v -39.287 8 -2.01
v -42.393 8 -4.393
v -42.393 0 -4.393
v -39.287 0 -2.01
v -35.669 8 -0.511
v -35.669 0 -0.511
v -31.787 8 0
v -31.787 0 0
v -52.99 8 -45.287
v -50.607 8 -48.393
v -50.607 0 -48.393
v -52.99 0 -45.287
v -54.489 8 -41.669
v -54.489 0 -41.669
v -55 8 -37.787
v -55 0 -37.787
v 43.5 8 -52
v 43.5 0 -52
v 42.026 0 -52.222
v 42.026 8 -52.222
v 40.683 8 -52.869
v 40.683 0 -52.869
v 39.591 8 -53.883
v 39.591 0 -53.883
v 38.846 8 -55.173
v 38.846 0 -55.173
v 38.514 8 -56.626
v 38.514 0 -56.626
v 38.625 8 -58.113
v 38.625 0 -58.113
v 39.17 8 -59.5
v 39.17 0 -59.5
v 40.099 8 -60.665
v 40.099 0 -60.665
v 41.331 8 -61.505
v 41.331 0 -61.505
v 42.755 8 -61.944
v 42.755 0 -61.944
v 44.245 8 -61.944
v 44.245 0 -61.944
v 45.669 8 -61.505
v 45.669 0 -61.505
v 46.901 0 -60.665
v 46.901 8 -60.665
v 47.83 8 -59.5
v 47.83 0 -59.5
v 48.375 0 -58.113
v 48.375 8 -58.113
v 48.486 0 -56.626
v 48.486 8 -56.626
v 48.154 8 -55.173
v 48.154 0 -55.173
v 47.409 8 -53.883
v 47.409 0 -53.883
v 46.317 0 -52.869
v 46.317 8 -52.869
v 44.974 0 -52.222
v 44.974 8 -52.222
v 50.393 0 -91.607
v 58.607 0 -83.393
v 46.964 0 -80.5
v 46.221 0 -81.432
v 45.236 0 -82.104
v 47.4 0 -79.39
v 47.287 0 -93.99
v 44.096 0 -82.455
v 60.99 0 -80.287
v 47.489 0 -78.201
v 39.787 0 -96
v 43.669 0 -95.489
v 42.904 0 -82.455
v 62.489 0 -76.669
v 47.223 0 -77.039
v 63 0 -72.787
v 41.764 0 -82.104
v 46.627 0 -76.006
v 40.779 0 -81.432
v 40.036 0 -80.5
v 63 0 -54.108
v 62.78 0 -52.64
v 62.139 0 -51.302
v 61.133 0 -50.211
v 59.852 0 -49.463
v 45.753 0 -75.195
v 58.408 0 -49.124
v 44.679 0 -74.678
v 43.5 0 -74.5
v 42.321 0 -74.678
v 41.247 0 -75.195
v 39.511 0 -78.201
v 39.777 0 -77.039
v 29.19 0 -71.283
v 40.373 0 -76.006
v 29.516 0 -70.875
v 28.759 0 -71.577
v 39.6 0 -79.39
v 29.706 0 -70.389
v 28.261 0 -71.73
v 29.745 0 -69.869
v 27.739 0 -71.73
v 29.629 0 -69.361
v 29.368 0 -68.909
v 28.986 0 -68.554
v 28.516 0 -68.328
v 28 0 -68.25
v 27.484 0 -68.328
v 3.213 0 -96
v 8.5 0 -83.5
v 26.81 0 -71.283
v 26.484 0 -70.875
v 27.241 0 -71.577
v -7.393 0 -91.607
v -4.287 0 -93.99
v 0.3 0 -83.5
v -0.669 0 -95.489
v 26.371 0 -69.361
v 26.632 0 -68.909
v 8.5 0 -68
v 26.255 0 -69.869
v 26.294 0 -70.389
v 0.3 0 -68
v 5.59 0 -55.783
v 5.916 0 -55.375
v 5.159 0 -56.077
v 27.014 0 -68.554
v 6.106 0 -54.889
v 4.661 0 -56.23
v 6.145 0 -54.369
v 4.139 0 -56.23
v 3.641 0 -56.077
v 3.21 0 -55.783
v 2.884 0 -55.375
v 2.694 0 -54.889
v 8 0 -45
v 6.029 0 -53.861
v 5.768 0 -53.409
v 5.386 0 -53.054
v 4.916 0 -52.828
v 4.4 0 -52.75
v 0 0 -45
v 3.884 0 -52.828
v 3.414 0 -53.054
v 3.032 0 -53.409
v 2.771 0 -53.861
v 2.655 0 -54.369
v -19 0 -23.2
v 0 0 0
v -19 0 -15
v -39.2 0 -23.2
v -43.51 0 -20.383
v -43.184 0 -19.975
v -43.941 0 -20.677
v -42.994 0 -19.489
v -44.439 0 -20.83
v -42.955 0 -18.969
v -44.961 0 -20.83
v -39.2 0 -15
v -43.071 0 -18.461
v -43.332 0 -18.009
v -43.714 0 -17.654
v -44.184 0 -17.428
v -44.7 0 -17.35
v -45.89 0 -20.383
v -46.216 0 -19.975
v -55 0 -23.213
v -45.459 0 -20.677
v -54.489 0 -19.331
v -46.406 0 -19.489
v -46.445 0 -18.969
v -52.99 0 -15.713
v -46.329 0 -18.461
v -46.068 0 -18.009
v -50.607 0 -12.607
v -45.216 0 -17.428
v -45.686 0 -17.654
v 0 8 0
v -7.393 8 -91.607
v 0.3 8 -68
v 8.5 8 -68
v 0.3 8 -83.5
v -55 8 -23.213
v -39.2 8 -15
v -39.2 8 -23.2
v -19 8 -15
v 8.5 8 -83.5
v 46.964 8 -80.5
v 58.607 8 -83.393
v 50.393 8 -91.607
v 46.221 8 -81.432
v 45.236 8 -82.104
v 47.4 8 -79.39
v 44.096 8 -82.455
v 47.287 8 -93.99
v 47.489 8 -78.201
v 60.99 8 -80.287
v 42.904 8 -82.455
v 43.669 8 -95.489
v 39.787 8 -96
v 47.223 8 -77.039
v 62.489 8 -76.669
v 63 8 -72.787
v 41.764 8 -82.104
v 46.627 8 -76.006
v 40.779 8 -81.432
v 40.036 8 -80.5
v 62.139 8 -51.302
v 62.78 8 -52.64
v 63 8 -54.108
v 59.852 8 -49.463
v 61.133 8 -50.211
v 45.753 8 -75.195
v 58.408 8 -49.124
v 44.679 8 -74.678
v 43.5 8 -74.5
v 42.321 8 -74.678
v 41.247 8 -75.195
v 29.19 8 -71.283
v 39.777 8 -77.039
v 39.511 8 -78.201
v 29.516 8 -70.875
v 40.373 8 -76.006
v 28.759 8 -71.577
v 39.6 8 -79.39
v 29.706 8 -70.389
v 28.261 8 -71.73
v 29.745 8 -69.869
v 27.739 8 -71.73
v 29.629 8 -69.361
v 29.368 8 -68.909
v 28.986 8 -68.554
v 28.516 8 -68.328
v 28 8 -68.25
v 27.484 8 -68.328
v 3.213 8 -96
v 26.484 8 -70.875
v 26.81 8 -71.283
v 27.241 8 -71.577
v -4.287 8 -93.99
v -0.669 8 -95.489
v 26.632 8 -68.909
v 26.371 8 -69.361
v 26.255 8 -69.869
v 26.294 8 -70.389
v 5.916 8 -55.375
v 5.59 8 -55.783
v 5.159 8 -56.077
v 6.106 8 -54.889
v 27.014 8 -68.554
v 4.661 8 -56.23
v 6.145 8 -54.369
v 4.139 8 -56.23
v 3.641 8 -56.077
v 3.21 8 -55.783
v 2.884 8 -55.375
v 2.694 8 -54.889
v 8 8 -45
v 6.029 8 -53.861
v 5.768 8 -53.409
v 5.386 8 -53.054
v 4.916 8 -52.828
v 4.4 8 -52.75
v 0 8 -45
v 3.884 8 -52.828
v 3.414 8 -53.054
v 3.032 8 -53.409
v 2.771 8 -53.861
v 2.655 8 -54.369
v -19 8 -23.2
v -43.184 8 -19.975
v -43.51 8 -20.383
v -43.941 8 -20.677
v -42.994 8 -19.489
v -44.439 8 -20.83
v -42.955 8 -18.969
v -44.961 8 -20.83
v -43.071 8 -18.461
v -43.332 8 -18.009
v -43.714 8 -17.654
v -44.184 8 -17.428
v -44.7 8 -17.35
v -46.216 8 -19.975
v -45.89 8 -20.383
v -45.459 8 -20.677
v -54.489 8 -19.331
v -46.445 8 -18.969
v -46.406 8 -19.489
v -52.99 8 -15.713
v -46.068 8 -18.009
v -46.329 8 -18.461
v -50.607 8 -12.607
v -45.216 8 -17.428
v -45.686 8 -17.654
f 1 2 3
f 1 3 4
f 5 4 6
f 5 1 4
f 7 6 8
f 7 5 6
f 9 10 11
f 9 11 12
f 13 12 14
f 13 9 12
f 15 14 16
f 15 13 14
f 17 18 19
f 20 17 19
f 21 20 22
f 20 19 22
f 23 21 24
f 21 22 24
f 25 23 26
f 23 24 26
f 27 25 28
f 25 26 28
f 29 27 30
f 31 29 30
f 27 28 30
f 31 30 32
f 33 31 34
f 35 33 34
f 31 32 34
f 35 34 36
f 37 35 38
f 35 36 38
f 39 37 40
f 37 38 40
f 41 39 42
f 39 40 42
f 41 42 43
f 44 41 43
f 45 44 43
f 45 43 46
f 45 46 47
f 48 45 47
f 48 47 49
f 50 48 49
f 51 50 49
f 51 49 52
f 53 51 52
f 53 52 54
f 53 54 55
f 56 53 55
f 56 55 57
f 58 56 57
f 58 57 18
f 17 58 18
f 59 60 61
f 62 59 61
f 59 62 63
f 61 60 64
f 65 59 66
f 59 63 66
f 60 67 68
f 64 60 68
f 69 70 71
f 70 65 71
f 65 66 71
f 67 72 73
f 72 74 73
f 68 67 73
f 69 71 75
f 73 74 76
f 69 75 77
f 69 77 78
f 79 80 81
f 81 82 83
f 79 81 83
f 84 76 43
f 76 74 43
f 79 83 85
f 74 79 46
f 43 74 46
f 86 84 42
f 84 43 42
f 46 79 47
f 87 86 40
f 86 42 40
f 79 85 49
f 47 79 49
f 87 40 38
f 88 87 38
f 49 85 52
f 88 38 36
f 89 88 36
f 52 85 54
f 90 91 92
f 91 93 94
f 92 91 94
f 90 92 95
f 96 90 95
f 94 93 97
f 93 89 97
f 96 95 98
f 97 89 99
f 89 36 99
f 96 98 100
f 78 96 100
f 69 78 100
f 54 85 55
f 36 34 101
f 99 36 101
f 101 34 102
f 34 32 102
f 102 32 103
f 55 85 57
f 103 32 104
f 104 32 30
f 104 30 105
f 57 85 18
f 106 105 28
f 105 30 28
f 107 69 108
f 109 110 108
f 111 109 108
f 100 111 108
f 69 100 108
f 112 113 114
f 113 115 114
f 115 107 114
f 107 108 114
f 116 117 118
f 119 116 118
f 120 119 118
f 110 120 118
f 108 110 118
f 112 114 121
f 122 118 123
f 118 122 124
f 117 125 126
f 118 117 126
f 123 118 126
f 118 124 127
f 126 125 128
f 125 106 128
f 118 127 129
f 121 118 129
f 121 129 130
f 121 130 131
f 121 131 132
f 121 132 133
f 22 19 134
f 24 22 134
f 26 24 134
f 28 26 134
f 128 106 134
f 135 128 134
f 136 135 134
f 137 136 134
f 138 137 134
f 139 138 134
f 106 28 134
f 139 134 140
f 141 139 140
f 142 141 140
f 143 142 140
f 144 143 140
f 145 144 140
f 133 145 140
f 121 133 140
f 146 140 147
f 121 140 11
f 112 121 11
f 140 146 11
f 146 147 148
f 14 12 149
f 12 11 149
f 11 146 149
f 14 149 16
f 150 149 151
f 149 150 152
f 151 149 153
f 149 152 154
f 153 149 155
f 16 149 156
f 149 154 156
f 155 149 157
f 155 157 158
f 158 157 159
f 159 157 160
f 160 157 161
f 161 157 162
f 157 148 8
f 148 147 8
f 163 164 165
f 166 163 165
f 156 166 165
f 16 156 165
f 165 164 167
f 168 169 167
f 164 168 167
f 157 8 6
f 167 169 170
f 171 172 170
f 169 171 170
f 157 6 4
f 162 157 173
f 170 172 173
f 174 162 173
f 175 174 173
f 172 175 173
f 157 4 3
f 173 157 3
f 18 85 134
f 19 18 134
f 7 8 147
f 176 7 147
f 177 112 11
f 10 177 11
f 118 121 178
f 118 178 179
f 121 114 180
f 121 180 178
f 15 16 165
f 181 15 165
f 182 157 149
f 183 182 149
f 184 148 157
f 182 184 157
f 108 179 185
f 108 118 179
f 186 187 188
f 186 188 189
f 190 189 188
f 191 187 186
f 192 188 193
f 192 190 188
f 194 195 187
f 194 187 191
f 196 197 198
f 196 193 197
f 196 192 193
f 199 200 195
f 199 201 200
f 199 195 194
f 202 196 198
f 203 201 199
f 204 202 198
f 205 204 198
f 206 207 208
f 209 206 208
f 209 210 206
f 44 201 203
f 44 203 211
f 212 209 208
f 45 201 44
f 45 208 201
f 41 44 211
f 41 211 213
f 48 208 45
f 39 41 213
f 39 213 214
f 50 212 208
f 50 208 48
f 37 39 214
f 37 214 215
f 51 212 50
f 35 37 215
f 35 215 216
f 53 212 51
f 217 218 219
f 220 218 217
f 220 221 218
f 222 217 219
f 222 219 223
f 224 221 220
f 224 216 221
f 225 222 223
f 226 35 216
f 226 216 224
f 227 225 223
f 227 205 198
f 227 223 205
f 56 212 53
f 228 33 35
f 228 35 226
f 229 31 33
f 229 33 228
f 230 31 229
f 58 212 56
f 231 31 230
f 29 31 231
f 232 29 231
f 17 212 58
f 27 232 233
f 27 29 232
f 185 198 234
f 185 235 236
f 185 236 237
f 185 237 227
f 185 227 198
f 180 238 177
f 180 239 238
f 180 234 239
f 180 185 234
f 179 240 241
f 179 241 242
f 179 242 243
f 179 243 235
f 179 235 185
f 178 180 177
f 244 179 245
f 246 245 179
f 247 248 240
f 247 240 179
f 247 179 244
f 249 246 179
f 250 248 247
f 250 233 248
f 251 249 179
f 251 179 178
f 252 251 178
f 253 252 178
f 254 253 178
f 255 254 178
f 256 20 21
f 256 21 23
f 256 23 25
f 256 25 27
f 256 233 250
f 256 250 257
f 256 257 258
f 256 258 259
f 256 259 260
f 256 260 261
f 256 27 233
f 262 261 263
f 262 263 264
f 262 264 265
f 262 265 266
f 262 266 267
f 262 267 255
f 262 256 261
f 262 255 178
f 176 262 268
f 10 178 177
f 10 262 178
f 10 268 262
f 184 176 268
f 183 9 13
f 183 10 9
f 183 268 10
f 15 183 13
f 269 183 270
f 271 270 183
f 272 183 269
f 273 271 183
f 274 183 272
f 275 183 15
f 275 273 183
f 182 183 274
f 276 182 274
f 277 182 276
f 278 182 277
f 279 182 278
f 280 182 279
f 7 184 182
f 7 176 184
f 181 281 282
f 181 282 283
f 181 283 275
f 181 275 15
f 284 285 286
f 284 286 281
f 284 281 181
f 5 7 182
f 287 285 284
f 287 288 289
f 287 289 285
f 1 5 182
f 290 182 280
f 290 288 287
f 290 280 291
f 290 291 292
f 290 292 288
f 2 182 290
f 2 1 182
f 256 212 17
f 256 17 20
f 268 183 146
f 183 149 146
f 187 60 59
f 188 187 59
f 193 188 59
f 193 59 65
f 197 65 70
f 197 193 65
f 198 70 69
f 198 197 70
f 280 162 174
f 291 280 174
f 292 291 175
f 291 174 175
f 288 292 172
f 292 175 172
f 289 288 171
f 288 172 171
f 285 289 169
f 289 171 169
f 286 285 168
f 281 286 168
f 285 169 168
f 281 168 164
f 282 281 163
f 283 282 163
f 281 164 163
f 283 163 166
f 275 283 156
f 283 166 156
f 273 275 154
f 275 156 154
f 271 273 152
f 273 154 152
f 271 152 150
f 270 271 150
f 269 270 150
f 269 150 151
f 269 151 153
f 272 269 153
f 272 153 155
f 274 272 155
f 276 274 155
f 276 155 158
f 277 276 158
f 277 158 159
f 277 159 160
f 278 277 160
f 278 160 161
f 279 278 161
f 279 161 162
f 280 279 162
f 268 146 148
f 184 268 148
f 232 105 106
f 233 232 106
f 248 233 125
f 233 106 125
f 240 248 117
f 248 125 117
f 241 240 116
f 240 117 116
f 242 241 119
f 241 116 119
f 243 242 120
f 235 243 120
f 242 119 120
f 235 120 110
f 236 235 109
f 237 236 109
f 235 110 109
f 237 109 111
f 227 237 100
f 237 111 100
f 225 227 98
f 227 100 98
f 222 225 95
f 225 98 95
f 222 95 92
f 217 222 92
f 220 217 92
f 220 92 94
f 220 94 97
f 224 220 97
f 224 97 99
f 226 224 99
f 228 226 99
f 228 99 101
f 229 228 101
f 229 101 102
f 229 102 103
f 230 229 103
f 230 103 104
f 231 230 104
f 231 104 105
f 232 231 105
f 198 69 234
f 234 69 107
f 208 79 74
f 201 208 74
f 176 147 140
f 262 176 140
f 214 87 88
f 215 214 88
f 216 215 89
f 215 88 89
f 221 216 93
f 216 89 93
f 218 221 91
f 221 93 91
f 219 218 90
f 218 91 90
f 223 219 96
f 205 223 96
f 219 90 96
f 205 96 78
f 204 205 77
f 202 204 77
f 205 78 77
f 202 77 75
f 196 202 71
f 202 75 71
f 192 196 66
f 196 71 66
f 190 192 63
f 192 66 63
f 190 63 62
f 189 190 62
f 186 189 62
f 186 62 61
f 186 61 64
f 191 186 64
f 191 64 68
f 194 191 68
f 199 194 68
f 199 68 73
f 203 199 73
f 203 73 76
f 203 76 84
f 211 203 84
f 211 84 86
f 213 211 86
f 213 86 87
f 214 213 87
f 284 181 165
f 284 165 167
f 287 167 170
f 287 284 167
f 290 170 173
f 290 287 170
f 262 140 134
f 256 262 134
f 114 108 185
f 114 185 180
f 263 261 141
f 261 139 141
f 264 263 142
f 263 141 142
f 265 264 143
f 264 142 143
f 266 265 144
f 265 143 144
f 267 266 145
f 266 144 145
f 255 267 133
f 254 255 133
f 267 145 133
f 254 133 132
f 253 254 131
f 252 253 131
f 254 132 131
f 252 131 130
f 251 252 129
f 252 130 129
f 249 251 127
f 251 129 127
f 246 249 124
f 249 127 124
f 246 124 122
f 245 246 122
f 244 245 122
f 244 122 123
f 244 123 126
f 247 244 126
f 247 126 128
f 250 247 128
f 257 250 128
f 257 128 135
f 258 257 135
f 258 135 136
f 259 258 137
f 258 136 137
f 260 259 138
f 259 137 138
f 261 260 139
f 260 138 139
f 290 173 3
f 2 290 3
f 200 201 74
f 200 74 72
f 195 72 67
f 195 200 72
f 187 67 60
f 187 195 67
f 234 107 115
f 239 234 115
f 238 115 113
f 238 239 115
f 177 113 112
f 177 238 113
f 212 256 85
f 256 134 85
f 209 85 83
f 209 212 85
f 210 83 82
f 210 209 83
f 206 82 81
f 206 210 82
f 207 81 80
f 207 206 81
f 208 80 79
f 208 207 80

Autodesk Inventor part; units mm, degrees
ref_plane "YZ Plane" through (0, 0, 0) normal (1, 0, 0) x (0, 1, 0)
sketch "Sketch1" plane through (0, 0, 0) normal (0, 1, 0) x (-1, 0, 0)
  line L0 (38, 0) -> (0, 0)
  line L1 (0, 0) -> (0, -45)
  line L2 (0, -45) -> (-8, -45)
  line L3 (-8, -45) -> (-63, -49.5)
  line L4 (-63, -49.5) -> (-63, -79)
  line L5 (-63, -79) -> (-46, -96)
  line L6 (-46, -96) -> (3, -96)
  line L7 (3, -96) -> (55, -44)
  line L8 (55, -44) -> (55, -17)
  line L9 (55, -17) -> (38, 0)
  line L10 (19, -15) -> (39.2, -15)
  line L11 (39.2, -15) -> (39.2, -23.2)
  line L12 (39.2, -23.2) -> (19, -23.2)
  line L13 (19, -23.2) -> (19, -15)
  line L14 (-0.3, -68) -> (-8.5, -68)
  line L15 (-8.5, -68) -> (-8.5, -83.5)
  line L16 (-8.5, -83.5) -> (-0.3, -83.5)
  line L17 (-0.3, -83.5) -> (-0.3, -68)
  dimension "d0" = 45
  dimension "d1" = 55
  dimension "d2" = 63
  dimension "d3" = 96
  dimension "d4" = 8
  dimension "d6" = 45
  dimension "d7" = 45
  dimension "d8" = 45
  dimension "d9" = 46.5
  dimension "d10" = 17
  dimension "d11" = 44
  dimension "d12" = 17
  dimension "d13" = 8.2
  dimension "d14" = 20.2
  dimension "d15" = 8.2
  dimension "d16" = 15.5
  dimension "d17" = 12.5
  dimension "d18" = 19
  dimension "d19" = 15
  dimension "d20" = 54.5
extrude "Extrusion1" add sketch "Sketch1" along normal blind 8
fillet "Fillet1" radius 15 6 edges at (-38, 4, 0) (-55, 4, -17) (-55, 4, -44) (-3, 4, -96) (46, 4, -96) (63, 4, -79)
fillet "Fillet2" radius 5 1 edges at (63, 4, -49.5)
sketch "Sketch2" plane through (0, 8, 0) normal (0, 1, 0) x (1, 0, 0)
  arc A0 (58.4077, 49.1243) -> (63, 54.1076) centre (58, 54.1076) ccw construction
  line L0 (63, 54.1076) -> (63, 72.7868) construction
  arc A1 (63, 72.7868) -> (58.6066, 83.3934) centre (48, 72.7868) ccw construction
  line L1 (58.6066, 83.3934) -> (50.3934, 91.6066) construction
  arc A2 (50.3934, 91.6066) -> (39.7868, 96) centre (39.7868, 81) ccw construction
  line L2 (39.7868, 96) -> (3.2132, 96) construction
  arc A3 (3.2132, 96) -> (-7.3934, 91.6066) centre (3.2132, 81) ccw construction
  line L3 (-7.3934, 91.6066) -> (-50.6066, 48.3934) construction
  arc A4 (-50.6066, 48.3934) -> (-55, 37.7868) centre (-40, 37.7868) ccw construction
  line L4 (-55, 37.7868) -> (-55, 23.2132) construction
  arc A5 (-55, 23.2132) -> (-50.6066, 12.6066) centre (-40, 23.2132) ccw construction
  line L5 (-50.6066, 12.6066) -> (-42.3934, 4.3934) construction
  arc A6 (-42.3934, 4.3934) -> (-31.7868, 0) centre (-31.7868, 15) ccw construction
  line L6 (-31.7868, 0) -> (0, 0) construction
  line L7 (0, 0) -> (0, 45) construction
  line L8 (0, 45) -> (8, 45) construction
  line L9 (8, 45) -> (58.4077, 49.1243) construction
  line L10 (0.3, 68) -> (0.3, 83.5) construction
  line L11 (0.3, 83.5) -> (8.5, 83.5) construction
  line L12 (8.5, 83.5) -> (8.5, 68) construction
  line L13 (8.5, 68) -> (0.3, 68) construction
  line L14 (-39.2, 15) -> (-39.2, 23.2) construction
  line L15 (-39.2, 23.2) -> (-19, 23.2) construction
  line L16 (-19, 23.2) -> (-19, 15) construction
  line L17 (-19, 15) -> (-39.2, 15) construction
  line L18 (-39.2, 23.2) -> (-39.2, 15) construction
  line L19 (-39.2, 19.1) -> (-44.7, 19.1) construction
  line L20 (4.4, 54.5) -> (4.4, 68) construction
  line L21 (0.3, 68) -> (8.5, 68) construction
  line L22 (43.5, 78.5) -> (43.5, 57) construction
  line L23 (-39.2, 15) -> (-39.2, 23.2) construction
  line L24 (8.5, 68) -> (0.3, 68) construction
  point P0 (28, 70)
  dimension "d25" = 5.5
  dimension "d26" = 13.5
  dimension "d27" = 26
  dimension "d28" = 35
  dimension "d29" = 19.5
  dimension "d30" = 17.5
  dimension "d31" = 39
hole "Hole1" at (28, 8, -70) at (4.4, 8, -54.5) at (-44.7, 8, -19.1) direction (0, -1, 0) diameter 3.5 end through all
hole "Hole2" at (43.5, 8, -78.5) direction (0, -1, 0) diameter 8 end through all
hole "Hole3" at (43.5, 8, -57) direction (0, -1, 0) diameter 10 end through all
ref_plane "Work Plane1" through (4.4, 8, -54.5) normal (1, 0, 0) x (0, 0, -1)
ref_plane "Work Plane2" through (-39.2, 8, -19.1) normal (0, 0, -1) x (-1, 0, 0)
properties part number "A8-0004"
